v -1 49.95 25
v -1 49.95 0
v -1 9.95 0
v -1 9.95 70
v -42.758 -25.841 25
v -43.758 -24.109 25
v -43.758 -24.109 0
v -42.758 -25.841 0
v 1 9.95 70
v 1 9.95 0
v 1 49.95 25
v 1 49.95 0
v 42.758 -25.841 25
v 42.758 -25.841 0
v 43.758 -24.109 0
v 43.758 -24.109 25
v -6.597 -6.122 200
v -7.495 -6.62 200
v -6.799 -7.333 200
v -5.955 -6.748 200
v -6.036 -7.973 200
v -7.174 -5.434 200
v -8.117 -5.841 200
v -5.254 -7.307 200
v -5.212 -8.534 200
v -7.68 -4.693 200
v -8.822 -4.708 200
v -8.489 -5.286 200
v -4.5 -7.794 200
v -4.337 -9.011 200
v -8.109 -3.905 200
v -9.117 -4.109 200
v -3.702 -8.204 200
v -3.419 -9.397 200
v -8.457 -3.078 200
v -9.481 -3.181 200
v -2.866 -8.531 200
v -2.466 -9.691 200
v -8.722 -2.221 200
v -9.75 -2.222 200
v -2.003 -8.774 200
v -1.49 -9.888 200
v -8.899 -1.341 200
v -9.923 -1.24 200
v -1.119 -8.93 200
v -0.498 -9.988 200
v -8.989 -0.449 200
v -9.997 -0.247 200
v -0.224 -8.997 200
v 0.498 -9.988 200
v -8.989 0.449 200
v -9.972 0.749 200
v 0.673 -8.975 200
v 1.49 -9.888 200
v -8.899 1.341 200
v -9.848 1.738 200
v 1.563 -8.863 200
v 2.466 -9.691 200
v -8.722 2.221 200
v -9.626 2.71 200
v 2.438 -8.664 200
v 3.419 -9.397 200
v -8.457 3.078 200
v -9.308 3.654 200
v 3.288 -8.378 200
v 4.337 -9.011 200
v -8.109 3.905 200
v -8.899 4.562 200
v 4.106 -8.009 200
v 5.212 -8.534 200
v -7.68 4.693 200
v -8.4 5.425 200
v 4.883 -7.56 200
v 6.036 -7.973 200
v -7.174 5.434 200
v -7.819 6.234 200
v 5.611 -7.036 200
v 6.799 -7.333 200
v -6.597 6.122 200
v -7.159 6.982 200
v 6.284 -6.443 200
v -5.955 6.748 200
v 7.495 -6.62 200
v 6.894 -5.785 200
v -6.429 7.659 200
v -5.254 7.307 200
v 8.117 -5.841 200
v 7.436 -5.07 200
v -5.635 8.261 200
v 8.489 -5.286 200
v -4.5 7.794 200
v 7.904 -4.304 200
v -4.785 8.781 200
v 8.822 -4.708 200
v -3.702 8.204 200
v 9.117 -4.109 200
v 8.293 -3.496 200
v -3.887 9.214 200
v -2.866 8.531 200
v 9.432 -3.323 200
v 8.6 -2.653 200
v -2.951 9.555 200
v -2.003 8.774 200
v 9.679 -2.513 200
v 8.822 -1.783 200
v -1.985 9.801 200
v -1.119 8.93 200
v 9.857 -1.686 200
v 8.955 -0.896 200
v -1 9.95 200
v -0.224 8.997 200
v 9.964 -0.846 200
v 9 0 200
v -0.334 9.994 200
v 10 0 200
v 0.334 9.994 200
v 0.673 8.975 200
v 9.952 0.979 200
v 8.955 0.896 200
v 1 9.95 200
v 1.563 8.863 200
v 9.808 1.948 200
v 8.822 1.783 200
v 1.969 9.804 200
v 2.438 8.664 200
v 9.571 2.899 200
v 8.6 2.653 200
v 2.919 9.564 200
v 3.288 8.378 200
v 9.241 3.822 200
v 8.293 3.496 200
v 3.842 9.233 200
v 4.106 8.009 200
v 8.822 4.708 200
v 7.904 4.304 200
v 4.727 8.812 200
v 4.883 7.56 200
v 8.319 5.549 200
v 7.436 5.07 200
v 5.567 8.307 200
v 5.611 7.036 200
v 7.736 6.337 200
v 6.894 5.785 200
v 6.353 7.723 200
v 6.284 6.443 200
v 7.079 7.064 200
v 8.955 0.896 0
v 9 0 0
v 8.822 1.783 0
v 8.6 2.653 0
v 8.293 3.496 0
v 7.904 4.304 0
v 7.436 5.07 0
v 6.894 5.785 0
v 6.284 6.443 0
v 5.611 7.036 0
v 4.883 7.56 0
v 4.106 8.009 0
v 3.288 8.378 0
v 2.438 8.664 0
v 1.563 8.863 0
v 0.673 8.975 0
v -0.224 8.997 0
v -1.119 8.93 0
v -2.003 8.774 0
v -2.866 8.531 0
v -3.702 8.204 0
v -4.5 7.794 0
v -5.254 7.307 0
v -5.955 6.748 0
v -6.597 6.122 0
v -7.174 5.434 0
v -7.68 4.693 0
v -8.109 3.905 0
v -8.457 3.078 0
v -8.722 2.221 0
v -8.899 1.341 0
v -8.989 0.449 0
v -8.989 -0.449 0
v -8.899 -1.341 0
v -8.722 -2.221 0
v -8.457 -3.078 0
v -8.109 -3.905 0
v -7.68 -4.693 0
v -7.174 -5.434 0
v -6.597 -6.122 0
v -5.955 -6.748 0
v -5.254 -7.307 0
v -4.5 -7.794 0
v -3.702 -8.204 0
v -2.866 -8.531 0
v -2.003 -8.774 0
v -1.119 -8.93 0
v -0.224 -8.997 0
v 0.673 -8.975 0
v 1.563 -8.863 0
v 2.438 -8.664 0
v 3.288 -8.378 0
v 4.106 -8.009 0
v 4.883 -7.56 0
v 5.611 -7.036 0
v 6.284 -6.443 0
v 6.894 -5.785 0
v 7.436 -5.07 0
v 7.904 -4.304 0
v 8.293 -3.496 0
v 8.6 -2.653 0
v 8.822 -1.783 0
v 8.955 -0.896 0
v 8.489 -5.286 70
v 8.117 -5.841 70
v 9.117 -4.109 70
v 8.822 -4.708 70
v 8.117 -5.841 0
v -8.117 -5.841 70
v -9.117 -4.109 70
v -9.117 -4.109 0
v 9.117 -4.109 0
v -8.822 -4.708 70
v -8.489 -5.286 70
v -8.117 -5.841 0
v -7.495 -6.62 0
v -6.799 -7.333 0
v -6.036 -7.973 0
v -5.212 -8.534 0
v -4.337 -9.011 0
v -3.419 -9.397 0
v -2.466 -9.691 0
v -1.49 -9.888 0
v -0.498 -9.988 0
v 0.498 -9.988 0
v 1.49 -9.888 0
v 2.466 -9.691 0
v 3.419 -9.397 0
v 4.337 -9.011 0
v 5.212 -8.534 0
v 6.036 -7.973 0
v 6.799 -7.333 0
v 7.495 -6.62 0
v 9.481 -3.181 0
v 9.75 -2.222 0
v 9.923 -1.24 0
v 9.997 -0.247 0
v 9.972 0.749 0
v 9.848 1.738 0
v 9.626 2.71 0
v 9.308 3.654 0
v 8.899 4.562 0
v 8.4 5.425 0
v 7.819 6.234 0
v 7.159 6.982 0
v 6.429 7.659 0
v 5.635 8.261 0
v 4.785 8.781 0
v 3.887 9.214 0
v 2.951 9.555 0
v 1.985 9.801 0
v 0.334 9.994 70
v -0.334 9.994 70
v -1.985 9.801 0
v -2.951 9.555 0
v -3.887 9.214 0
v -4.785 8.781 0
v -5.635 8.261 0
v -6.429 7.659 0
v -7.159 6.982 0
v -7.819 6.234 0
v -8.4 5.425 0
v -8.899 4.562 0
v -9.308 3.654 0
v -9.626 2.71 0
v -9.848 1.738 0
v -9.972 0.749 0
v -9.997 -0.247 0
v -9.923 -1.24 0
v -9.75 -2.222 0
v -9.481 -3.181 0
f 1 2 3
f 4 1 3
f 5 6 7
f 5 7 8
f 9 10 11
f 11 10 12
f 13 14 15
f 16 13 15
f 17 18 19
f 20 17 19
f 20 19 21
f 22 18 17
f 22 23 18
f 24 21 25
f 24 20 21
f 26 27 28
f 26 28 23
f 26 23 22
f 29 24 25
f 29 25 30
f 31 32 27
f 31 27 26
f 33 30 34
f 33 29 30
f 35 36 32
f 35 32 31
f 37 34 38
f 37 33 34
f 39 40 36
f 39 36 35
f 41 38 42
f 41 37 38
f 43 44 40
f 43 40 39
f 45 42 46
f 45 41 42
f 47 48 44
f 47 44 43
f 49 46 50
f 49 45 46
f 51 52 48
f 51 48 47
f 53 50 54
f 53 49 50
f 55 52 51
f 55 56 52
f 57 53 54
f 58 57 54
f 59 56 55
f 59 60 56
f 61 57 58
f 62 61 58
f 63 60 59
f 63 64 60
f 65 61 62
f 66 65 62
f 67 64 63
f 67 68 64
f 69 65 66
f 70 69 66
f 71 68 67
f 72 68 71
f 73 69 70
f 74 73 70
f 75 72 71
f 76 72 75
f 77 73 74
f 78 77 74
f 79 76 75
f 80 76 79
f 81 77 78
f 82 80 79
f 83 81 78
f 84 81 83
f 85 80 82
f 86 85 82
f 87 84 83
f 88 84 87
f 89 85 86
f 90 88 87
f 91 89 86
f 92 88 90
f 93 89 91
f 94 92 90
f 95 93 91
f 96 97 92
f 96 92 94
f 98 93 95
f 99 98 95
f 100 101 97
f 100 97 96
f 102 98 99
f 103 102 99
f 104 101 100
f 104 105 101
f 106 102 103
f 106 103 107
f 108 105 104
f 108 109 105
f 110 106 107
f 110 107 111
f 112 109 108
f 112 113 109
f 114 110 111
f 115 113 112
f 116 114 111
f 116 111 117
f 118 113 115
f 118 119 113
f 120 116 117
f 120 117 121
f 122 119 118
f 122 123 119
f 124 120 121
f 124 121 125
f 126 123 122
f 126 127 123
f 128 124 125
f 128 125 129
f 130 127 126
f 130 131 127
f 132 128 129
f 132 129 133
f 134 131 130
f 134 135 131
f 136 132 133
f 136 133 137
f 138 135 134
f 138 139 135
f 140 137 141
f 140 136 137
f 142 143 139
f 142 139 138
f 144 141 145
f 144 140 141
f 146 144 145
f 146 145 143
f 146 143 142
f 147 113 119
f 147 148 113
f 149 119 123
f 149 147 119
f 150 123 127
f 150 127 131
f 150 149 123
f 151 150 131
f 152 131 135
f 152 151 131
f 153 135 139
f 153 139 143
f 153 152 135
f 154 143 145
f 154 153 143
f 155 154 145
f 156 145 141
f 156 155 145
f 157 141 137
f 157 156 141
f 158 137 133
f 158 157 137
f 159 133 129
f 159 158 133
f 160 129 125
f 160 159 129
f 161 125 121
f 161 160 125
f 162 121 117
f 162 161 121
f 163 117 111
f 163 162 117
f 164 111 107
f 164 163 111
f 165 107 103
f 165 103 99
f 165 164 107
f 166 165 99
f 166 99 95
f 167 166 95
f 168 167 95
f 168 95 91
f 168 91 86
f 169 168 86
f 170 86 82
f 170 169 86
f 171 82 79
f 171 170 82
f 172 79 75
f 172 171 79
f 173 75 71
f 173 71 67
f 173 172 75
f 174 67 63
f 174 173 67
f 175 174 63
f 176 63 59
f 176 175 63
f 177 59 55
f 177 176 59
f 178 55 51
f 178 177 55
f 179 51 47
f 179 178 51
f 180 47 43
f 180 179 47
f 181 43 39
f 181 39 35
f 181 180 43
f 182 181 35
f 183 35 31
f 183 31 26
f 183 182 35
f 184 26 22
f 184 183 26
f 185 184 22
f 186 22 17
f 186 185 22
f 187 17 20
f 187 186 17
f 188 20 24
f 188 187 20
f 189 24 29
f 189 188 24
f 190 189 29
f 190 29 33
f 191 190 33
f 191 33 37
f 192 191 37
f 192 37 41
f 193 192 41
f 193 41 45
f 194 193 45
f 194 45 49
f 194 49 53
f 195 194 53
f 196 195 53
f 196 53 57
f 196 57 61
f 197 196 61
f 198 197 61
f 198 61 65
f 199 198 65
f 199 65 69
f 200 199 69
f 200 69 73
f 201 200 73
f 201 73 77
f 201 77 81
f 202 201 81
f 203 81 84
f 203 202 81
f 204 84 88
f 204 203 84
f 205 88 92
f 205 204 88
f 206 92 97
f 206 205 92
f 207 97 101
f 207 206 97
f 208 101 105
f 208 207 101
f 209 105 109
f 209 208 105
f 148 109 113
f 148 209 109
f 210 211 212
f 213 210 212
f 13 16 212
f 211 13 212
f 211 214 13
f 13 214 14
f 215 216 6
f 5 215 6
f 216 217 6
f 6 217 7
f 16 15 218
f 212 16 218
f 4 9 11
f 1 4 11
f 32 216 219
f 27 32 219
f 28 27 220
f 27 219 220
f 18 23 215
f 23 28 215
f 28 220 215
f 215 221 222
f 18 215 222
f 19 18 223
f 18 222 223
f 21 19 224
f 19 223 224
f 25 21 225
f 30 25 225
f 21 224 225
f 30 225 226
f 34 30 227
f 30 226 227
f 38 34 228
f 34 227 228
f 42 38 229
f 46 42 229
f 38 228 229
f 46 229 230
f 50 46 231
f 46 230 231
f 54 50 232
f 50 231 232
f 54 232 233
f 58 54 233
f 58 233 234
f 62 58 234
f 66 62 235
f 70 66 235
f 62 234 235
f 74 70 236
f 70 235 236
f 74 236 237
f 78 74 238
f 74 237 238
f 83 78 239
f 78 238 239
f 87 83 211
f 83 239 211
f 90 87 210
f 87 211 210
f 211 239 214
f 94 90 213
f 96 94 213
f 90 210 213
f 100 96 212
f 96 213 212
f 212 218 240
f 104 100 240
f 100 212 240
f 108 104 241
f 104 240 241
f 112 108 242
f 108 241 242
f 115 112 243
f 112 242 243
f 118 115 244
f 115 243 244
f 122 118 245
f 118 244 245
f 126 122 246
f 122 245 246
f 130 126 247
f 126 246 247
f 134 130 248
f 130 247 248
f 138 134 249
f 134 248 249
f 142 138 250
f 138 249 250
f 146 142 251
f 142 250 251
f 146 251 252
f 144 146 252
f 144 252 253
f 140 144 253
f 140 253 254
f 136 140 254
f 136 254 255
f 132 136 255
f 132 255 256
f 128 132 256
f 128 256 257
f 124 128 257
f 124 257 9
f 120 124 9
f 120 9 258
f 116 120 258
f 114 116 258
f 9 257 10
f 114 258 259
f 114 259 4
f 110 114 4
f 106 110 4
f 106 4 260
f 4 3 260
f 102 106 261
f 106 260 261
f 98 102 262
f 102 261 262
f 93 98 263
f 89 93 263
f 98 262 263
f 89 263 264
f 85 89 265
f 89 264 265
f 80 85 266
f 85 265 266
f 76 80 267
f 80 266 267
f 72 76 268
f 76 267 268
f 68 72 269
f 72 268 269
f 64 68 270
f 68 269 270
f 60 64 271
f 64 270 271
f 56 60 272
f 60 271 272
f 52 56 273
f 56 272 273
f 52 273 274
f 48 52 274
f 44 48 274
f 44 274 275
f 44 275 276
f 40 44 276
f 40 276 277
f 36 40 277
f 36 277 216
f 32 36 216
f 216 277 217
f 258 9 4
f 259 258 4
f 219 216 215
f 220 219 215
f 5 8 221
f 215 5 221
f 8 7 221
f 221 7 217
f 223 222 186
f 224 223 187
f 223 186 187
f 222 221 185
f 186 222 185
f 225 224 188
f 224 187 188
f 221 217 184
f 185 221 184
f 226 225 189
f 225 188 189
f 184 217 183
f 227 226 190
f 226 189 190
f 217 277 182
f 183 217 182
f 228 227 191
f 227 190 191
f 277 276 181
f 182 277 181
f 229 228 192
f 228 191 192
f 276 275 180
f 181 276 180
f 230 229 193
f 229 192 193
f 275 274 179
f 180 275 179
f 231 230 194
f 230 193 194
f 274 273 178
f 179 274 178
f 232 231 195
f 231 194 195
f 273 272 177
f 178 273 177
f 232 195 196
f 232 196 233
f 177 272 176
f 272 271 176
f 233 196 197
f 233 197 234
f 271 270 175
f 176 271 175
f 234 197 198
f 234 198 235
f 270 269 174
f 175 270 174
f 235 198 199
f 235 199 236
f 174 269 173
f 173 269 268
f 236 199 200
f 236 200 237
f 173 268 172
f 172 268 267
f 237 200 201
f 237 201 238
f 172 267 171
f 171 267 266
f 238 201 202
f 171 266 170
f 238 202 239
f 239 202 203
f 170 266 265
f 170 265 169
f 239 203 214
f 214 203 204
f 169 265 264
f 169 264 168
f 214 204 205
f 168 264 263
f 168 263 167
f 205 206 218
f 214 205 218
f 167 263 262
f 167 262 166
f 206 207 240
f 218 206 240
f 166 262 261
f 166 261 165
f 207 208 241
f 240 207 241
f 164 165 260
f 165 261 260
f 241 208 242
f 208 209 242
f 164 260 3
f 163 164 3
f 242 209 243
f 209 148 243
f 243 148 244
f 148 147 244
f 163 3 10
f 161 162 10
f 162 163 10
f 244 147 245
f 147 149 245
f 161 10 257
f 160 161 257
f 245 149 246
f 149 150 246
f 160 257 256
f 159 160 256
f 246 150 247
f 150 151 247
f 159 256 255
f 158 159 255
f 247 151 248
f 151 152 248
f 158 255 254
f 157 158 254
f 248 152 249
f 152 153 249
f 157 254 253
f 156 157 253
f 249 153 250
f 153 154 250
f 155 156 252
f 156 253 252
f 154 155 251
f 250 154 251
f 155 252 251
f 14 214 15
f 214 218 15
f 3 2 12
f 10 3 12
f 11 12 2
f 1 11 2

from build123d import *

# Parameters (mm, degrees)
F0_R     = 9
F1_DEPTH = 70
F2_R     = 9
F3_DEPTH = 130
F5_DEPTH = 2
F7_DEPTH = 25
F9_DEPTH = 25


with BuildPart() as f1:
    # F0 (on Top) → F1 (new body)
    with BuildSketch(Plane.XY):
        with BuildLine():
            Line((-1, 49.9498743711), (-1, 9.9498743711))
            ThreePointArc((-1, 9.9498743711), (-8.6602540378, 5), (-9.1168439698, -4.1089117817))
            Line((-9.1168439698, -4.1089117817), (-43.7578601212, -24.1089117817))
            Line((-43.7578601212, -24.1089117817), (-43.2578601212, -24.9749371855))
            Line((-43.2578601212, -24.9749371855), (-42.7578601212, -25.8409625893))
            Line((-42.7578601212, -25.8409625893), (-8.1168439698, -5.8409625893))
            ThreePointArc((-8.1168439698, -5.8409625893), (0, -10), (8.1168439698, -5.8409625893))
            Line((8.1168439698, -5.8409625893), (42.7578601212, -25.8409625893))
            Line((42.7578601212, -25.8409625893), (43.2578601212, -24.9749371855))
            Line((43.2578601212, -24.9749371855), (43.7578601212, -24.1089117817))
            Line((43.7578601212, -24.1089117817), (9.1168439698, -4.1089117817))
            ThreePointArc((9.1168439698, -4.1089117817), (8.6602540378, 5), (1, 9.9498743711))
            Line((1, 9.9498743711), (1, 49.9498743711))
            Line((1, 49.9498743711), (0, 49.9498743711))
            Line((0, 49.9498743711), (-1, 49.9498743711))
        make_face()
        Circle(F0_R, mode=Mode.SUBTRACT)
    extrude(amount=F1_DEPTH)

    # F2 (on face) → F3 (join)
    with BuildSketch(Plane.XY.offset(70)):
        with BuildLine():
            ThreePointArc((9.1168439698, -4.1089117817), (9.7767182556, -2.1013757758), (10, 0))
            ThreePointArc((10, 0), (7.4161984871, 6.7082039325), (1, 9.9498743711))
            ThreePointArc((1, 9.9498743711), (0, 10), (-1, 9.9498743711))
            ThreePointArc((-1, 9.9498743711), (-8.6602540378, 5), (-9.1168439698, -4.1089117817))
            ThreePointArc((-9.1168439698, -4.1089117817), (-8.6602540378, -5), (-8.1168439698, -5.8409625893))
            ThreePointArc((-8.1168439698, -5.8409625893), (0, -10), (8.1168439698, -5.8409625893))
            ThreePointArc((8.1168439698, -5.8409625893), (8.6602540378, -5), (9.1168439698, -4.1089117817))
        make_face()
        Circle(F2_R, mode=Mode.SUBTRACT)
    extrude(amount=F3_DEPTH)

    # F4 (on face) → F5 (cut, through all)
    with BuildSketch(Plane.YZ.offset(1)):
        Polygon((49.9498743711, 70), (9.9498743711, 70), (49.9498743711, 25), align=None)
    extrude(amount=-F5_DEPTH, mode=Mode.SUBTRACT)

    # F6 (on face) → F7 (cut)
    with BuildSketch(Plane(origin=(0.5, 0.8660254038, 0), x_dir=(-0.8660254038, 0.5, 0), z_dir=(0.5, 0.8660254038, 0))):
        Polygon((-49.9498743711, 25), (-9.9498743711, 70), (-49.9498743711, 70), align=None)
    extrude(amount=-F7_DEPTH, mode=Mode.SUBTRACT)

    # F8 (on face) → F9 (cut)
    with BuildSketch(Plane(origin=(-0.5, 0.8660254038, 0), x_dir=(-0.8660254038, -0.5, 0), z_dir=(-0.5, 0.8660254038, 0))):
        Polygon((49.9498743711, 70), (9.9498743711, 70), (49.9498743711, 25), align=None)
    extrude(amount=-F9_DEPTH, mode=Mode.SUBTRACT)


solid = f1.part
